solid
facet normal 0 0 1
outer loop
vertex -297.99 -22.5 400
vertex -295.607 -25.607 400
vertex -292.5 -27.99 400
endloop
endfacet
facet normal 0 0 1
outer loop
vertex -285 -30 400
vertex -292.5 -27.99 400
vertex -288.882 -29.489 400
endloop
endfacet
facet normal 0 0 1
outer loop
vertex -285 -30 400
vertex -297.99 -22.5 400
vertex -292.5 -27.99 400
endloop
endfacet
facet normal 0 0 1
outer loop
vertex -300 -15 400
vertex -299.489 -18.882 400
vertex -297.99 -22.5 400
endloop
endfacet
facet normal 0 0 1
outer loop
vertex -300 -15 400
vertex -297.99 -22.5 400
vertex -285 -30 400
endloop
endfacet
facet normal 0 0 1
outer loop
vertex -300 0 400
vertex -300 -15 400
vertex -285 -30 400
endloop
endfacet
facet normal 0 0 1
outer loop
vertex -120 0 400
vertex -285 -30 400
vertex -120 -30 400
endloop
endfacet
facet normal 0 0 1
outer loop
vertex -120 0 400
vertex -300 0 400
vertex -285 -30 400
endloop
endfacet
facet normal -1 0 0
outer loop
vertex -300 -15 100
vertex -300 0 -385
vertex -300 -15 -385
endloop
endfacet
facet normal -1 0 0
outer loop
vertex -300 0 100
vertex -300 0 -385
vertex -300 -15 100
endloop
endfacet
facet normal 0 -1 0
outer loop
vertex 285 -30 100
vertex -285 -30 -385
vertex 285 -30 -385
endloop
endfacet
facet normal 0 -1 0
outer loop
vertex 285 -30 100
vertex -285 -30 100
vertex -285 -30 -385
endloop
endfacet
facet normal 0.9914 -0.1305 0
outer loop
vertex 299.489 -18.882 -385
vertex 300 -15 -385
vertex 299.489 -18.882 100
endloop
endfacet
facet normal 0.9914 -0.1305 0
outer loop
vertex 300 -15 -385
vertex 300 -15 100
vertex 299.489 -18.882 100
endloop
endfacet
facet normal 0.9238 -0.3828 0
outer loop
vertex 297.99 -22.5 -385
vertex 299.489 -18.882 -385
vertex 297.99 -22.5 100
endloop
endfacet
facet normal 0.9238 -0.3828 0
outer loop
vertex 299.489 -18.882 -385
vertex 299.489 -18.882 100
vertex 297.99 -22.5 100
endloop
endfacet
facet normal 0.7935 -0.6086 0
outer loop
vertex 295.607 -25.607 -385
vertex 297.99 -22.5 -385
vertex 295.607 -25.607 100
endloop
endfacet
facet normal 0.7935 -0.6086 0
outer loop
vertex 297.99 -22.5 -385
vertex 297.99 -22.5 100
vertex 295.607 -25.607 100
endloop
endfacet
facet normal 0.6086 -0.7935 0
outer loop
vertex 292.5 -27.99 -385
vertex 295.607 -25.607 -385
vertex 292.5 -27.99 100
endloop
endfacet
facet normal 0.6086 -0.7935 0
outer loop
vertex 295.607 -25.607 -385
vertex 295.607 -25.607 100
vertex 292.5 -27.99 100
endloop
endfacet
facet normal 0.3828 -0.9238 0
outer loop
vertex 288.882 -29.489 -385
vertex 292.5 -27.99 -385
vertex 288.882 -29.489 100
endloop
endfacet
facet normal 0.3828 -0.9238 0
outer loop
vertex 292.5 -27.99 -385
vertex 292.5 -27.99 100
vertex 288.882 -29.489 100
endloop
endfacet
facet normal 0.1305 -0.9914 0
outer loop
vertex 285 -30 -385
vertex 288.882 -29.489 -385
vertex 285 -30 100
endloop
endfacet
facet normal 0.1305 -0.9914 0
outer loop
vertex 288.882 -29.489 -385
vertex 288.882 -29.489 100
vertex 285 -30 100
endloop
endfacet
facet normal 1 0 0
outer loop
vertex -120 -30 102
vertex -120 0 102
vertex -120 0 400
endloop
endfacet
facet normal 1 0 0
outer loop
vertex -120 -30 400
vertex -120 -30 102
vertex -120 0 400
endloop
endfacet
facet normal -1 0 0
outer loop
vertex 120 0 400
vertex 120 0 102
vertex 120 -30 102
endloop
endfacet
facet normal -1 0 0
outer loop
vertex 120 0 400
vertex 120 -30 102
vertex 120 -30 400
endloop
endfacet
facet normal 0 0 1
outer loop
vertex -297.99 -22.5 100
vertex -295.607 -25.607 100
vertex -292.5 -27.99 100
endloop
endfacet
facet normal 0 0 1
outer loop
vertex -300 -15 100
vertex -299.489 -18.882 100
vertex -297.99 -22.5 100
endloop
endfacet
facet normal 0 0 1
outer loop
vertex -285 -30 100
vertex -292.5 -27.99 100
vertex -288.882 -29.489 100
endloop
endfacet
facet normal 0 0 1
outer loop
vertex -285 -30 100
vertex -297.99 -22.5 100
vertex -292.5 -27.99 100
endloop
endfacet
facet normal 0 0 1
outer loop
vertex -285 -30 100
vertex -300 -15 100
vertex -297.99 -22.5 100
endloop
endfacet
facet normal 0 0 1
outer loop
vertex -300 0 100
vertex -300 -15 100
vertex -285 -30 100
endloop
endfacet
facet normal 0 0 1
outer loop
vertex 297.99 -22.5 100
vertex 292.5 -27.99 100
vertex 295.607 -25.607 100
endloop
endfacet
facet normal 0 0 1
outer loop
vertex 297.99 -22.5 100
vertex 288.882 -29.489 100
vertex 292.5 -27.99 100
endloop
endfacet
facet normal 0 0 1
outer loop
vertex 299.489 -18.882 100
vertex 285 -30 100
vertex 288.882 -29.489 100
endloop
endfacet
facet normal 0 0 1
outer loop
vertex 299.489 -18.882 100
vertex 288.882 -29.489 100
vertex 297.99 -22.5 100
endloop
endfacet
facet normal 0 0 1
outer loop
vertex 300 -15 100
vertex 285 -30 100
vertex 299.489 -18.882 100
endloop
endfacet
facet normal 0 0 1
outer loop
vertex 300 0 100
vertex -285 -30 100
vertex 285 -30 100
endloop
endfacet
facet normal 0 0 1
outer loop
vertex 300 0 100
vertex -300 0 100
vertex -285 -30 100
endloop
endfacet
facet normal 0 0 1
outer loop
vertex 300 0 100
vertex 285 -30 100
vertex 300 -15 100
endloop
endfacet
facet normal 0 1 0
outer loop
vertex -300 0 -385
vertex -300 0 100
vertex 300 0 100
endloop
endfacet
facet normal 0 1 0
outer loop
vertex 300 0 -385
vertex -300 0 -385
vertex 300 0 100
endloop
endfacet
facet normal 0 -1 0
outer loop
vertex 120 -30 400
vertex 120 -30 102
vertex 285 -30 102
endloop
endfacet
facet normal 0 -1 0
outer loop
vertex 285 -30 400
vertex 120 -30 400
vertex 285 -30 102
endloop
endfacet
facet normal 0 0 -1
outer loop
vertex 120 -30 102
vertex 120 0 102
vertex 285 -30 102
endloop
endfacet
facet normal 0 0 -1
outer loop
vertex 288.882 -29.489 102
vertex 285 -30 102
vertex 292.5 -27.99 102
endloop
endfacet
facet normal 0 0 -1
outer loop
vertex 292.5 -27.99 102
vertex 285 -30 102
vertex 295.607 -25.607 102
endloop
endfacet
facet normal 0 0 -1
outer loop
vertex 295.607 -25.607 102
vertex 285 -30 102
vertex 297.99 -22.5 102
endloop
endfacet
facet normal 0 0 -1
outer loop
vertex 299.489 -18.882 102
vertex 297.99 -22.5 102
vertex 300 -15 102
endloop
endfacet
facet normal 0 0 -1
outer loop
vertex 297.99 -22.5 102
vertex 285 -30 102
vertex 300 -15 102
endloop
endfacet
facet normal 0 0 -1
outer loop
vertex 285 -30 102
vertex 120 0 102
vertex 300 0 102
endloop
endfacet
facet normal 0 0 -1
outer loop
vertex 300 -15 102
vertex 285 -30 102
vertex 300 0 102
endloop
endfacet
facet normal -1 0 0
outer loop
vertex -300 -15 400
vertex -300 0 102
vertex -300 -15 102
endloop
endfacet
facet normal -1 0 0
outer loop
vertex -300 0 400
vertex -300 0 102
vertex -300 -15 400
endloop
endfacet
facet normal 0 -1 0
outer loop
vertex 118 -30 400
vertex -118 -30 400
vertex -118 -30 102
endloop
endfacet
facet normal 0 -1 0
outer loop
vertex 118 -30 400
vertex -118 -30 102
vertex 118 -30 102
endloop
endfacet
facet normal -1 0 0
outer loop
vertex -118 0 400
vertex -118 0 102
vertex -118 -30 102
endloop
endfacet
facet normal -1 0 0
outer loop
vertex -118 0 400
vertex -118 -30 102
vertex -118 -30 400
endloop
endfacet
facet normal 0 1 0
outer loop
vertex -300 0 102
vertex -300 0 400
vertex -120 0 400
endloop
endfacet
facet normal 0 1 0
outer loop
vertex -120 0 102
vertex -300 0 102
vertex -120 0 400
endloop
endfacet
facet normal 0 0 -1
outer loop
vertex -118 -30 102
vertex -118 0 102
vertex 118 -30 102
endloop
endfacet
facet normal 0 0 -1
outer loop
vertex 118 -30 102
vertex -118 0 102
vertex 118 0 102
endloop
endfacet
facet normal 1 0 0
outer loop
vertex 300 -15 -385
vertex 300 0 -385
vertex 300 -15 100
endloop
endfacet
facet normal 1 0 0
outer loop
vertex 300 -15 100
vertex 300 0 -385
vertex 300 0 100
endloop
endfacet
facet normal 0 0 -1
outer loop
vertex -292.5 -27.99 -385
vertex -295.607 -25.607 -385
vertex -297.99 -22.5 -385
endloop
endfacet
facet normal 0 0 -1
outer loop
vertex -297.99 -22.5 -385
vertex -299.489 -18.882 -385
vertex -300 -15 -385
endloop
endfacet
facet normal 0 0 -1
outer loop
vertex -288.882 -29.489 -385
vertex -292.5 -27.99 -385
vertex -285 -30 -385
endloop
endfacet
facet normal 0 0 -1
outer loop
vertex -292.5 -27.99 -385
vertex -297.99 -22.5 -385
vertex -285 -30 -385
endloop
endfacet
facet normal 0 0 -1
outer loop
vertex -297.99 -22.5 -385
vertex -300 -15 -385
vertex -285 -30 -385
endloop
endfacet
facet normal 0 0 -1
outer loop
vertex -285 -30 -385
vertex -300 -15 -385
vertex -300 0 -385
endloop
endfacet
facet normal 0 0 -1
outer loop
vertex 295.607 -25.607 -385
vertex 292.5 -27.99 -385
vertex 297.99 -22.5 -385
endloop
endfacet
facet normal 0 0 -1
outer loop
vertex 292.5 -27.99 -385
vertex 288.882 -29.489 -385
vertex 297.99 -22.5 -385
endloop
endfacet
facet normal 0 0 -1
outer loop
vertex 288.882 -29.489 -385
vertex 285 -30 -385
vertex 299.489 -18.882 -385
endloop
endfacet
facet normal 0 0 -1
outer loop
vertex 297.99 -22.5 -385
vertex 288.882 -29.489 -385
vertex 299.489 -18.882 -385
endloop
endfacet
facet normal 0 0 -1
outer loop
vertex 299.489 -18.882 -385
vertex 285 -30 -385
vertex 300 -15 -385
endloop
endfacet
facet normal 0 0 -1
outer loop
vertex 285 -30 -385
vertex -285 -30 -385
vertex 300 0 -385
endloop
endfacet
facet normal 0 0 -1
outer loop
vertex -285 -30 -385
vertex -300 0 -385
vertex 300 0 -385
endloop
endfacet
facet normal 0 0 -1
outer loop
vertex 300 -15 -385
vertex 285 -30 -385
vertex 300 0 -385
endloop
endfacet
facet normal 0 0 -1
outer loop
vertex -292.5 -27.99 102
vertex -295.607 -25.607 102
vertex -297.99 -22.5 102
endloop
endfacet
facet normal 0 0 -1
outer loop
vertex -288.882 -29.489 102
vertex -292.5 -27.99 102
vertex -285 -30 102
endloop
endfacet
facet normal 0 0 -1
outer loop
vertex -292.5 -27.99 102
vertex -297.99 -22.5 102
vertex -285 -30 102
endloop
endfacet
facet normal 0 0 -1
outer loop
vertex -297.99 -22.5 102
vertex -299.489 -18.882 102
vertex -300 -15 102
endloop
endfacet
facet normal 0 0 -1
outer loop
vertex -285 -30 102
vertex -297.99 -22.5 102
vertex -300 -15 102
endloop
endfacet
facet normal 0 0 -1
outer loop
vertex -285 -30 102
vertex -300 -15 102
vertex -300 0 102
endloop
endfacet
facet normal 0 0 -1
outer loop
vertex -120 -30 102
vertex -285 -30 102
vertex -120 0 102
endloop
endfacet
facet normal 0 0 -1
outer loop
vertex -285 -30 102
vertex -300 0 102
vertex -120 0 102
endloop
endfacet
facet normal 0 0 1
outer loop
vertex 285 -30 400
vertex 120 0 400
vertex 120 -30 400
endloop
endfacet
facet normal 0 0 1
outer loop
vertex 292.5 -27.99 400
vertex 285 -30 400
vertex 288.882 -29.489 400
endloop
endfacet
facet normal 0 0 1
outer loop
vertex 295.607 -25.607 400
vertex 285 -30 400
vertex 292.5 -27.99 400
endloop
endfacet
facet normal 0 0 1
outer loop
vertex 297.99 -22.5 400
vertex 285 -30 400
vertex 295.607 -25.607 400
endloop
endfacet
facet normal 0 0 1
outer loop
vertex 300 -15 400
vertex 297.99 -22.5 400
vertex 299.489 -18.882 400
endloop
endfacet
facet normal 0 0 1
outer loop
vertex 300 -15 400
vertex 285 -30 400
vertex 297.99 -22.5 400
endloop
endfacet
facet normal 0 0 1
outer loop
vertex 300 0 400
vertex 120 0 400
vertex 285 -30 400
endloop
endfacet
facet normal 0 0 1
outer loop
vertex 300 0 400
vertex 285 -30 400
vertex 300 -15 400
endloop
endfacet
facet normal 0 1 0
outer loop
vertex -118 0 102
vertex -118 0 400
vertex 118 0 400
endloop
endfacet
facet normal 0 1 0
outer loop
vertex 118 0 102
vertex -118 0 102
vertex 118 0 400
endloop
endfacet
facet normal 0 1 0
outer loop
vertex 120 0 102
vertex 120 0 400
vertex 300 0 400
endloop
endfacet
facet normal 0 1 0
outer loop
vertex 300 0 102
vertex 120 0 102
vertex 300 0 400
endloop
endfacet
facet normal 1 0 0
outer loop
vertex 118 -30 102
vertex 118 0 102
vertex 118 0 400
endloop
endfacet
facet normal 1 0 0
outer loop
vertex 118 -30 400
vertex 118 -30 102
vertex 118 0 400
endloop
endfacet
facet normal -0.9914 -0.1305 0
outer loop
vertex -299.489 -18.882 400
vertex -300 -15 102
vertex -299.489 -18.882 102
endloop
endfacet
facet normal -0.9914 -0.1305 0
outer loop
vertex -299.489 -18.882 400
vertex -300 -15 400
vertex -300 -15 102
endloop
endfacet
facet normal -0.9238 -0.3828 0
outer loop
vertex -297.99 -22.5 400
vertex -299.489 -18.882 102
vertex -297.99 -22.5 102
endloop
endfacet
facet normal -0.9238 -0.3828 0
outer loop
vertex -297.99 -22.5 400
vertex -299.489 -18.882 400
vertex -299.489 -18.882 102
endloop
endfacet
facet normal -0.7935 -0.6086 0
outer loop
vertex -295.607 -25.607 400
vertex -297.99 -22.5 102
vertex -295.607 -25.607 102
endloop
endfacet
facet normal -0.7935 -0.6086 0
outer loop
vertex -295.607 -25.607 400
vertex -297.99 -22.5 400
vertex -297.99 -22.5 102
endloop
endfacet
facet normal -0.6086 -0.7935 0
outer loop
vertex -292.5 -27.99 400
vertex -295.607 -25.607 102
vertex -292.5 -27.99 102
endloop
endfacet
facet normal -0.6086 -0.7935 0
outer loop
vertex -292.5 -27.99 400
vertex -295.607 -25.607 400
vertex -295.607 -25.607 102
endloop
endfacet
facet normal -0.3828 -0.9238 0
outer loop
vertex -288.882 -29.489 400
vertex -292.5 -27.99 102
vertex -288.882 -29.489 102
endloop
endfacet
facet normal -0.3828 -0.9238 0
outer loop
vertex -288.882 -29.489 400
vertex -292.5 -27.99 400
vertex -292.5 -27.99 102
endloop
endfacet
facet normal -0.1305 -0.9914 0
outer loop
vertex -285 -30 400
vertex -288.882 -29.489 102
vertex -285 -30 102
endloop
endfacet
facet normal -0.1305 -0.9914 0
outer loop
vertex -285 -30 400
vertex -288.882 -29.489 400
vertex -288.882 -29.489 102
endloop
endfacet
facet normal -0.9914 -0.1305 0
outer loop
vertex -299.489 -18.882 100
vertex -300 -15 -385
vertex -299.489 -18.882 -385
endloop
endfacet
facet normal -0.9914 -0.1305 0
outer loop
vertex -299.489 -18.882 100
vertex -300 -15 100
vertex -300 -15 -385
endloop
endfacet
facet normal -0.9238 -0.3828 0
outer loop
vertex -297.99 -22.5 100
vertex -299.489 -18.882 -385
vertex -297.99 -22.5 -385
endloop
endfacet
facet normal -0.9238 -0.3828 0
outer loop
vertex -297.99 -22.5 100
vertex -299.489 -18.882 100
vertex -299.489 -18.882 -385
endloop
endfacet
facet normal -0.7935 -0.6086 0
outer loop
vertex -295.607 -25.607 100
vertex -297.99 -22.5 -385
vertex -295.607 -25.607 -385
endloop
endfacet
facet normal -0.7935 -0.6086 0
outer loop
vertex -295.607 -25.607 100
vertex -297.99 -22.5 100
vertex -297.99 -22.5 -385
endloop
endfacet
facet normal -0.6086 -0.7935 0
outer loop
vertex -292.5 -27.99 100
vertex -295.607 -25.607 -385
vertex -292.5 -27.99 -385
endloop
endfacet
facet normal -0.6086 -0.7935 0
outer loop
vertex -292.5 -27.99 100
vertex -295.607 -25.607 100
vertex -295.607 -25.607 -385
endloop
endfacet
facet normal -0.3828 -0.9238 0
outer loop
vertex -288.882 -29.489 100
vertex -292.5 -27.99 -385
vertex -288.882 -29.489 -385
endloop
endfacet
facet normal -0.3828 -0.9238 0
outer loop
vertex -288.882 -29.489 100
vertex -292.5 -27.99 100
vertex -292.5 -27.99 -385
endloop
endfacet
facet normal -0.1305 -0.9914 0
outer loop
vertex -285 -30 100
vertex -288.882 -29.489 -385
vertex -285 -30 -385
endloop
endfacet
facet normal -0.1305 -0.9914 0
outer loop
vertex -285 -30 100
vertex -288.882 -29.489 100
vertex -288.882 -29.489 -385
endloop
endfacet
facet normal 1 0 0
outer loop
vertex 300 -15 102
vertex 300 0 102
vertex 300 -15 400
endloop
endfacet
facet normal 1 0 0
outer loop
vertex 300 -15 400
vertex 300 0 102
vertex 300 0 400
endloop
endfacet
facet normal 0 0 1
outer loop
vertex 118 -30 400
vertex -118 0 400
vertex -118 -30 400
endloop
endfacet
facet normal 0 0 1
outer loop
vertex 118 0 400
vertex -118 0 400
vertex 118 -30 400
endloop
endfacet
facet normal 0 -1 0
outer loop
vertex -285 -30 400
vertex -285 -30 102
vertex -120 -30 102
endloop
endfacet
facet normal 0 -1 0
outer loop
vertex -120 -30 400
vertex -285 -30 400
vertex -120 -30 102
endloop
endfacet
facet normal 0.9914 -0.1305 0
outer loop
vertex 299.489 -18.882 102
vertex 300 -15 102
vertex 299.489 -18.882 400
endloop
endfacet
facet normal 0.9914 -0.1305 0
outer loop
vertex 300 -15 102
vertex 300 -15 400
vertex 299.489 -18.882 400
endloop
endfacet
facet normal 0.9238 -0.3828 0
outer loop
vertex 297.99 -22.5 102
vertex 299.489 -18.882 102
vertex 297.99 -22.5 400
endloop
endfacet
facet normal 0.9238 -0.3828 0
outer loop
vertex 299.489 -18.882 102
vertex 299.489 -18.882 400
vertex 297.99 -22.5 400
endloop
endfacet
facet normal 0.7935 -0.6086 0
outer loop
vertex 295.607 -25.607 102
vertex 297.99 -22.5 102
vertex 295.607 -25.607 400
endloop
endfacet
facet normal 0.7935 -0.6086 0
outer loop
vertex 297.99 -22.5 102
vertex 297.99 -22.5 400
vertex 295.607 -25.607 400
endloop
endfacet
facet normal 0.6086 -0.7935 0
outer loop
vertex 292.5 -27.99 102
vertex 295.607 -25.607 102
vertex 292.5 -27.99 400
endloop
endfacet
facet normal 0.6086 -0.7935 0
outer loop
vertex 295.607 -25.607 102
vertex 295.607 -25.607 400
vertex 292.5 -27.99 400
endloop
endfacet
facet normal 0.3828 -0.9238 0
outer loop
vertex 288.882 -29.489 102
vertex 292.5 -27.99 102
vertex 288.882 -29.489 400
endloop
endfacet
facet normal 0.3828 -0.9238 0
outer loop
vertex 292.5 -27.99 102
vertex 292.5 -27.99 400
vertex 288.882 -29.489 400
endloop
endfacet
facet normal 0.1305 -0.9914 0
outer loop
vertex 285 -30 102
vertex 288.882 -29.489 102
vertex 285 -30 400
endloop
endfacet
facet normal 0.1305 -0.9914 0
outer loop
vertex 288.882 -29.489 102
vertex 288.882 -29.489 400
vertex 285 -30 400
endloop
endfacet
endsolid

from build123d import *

# Parameters (mm, degrees)
F0_W     = 600
F0_H     = 485
F0_W_2   = 180
F0_H_2   = 298
F0_W_3   = 236
F1_DEPTH = 30
F2_R     = 15


with BuildPart() as f1:
    # F0 (on Front) → F1 (new body)
    with BuildSketch(Plane.XZ):
        with Locations((0, -142.5)):
            Rectangle(F0_W, F0_H)
        with Locations((-210, 251)):
            Rectangle(F0_W_2, F0_H_2)
        with Locations((210, 251)):
            Rectangle(F0_W_2, F0_H_2)
        with Locations((0, 251)):
            Rectangle(F0_W_3, F0_H_2)
    extrude(amount=F1_DEPTH)

    # F2
    f2_edges = [f1.edges().sort_by_distance(p)[0] for p in [
        (-300, -30, 251),
        (-300, -30, -142.5),
        (300, -30, 251),
        (300, -30, -142.5),
    ]]
    fillet(f2_edges, radius=F2_R)


solid = f1.part
